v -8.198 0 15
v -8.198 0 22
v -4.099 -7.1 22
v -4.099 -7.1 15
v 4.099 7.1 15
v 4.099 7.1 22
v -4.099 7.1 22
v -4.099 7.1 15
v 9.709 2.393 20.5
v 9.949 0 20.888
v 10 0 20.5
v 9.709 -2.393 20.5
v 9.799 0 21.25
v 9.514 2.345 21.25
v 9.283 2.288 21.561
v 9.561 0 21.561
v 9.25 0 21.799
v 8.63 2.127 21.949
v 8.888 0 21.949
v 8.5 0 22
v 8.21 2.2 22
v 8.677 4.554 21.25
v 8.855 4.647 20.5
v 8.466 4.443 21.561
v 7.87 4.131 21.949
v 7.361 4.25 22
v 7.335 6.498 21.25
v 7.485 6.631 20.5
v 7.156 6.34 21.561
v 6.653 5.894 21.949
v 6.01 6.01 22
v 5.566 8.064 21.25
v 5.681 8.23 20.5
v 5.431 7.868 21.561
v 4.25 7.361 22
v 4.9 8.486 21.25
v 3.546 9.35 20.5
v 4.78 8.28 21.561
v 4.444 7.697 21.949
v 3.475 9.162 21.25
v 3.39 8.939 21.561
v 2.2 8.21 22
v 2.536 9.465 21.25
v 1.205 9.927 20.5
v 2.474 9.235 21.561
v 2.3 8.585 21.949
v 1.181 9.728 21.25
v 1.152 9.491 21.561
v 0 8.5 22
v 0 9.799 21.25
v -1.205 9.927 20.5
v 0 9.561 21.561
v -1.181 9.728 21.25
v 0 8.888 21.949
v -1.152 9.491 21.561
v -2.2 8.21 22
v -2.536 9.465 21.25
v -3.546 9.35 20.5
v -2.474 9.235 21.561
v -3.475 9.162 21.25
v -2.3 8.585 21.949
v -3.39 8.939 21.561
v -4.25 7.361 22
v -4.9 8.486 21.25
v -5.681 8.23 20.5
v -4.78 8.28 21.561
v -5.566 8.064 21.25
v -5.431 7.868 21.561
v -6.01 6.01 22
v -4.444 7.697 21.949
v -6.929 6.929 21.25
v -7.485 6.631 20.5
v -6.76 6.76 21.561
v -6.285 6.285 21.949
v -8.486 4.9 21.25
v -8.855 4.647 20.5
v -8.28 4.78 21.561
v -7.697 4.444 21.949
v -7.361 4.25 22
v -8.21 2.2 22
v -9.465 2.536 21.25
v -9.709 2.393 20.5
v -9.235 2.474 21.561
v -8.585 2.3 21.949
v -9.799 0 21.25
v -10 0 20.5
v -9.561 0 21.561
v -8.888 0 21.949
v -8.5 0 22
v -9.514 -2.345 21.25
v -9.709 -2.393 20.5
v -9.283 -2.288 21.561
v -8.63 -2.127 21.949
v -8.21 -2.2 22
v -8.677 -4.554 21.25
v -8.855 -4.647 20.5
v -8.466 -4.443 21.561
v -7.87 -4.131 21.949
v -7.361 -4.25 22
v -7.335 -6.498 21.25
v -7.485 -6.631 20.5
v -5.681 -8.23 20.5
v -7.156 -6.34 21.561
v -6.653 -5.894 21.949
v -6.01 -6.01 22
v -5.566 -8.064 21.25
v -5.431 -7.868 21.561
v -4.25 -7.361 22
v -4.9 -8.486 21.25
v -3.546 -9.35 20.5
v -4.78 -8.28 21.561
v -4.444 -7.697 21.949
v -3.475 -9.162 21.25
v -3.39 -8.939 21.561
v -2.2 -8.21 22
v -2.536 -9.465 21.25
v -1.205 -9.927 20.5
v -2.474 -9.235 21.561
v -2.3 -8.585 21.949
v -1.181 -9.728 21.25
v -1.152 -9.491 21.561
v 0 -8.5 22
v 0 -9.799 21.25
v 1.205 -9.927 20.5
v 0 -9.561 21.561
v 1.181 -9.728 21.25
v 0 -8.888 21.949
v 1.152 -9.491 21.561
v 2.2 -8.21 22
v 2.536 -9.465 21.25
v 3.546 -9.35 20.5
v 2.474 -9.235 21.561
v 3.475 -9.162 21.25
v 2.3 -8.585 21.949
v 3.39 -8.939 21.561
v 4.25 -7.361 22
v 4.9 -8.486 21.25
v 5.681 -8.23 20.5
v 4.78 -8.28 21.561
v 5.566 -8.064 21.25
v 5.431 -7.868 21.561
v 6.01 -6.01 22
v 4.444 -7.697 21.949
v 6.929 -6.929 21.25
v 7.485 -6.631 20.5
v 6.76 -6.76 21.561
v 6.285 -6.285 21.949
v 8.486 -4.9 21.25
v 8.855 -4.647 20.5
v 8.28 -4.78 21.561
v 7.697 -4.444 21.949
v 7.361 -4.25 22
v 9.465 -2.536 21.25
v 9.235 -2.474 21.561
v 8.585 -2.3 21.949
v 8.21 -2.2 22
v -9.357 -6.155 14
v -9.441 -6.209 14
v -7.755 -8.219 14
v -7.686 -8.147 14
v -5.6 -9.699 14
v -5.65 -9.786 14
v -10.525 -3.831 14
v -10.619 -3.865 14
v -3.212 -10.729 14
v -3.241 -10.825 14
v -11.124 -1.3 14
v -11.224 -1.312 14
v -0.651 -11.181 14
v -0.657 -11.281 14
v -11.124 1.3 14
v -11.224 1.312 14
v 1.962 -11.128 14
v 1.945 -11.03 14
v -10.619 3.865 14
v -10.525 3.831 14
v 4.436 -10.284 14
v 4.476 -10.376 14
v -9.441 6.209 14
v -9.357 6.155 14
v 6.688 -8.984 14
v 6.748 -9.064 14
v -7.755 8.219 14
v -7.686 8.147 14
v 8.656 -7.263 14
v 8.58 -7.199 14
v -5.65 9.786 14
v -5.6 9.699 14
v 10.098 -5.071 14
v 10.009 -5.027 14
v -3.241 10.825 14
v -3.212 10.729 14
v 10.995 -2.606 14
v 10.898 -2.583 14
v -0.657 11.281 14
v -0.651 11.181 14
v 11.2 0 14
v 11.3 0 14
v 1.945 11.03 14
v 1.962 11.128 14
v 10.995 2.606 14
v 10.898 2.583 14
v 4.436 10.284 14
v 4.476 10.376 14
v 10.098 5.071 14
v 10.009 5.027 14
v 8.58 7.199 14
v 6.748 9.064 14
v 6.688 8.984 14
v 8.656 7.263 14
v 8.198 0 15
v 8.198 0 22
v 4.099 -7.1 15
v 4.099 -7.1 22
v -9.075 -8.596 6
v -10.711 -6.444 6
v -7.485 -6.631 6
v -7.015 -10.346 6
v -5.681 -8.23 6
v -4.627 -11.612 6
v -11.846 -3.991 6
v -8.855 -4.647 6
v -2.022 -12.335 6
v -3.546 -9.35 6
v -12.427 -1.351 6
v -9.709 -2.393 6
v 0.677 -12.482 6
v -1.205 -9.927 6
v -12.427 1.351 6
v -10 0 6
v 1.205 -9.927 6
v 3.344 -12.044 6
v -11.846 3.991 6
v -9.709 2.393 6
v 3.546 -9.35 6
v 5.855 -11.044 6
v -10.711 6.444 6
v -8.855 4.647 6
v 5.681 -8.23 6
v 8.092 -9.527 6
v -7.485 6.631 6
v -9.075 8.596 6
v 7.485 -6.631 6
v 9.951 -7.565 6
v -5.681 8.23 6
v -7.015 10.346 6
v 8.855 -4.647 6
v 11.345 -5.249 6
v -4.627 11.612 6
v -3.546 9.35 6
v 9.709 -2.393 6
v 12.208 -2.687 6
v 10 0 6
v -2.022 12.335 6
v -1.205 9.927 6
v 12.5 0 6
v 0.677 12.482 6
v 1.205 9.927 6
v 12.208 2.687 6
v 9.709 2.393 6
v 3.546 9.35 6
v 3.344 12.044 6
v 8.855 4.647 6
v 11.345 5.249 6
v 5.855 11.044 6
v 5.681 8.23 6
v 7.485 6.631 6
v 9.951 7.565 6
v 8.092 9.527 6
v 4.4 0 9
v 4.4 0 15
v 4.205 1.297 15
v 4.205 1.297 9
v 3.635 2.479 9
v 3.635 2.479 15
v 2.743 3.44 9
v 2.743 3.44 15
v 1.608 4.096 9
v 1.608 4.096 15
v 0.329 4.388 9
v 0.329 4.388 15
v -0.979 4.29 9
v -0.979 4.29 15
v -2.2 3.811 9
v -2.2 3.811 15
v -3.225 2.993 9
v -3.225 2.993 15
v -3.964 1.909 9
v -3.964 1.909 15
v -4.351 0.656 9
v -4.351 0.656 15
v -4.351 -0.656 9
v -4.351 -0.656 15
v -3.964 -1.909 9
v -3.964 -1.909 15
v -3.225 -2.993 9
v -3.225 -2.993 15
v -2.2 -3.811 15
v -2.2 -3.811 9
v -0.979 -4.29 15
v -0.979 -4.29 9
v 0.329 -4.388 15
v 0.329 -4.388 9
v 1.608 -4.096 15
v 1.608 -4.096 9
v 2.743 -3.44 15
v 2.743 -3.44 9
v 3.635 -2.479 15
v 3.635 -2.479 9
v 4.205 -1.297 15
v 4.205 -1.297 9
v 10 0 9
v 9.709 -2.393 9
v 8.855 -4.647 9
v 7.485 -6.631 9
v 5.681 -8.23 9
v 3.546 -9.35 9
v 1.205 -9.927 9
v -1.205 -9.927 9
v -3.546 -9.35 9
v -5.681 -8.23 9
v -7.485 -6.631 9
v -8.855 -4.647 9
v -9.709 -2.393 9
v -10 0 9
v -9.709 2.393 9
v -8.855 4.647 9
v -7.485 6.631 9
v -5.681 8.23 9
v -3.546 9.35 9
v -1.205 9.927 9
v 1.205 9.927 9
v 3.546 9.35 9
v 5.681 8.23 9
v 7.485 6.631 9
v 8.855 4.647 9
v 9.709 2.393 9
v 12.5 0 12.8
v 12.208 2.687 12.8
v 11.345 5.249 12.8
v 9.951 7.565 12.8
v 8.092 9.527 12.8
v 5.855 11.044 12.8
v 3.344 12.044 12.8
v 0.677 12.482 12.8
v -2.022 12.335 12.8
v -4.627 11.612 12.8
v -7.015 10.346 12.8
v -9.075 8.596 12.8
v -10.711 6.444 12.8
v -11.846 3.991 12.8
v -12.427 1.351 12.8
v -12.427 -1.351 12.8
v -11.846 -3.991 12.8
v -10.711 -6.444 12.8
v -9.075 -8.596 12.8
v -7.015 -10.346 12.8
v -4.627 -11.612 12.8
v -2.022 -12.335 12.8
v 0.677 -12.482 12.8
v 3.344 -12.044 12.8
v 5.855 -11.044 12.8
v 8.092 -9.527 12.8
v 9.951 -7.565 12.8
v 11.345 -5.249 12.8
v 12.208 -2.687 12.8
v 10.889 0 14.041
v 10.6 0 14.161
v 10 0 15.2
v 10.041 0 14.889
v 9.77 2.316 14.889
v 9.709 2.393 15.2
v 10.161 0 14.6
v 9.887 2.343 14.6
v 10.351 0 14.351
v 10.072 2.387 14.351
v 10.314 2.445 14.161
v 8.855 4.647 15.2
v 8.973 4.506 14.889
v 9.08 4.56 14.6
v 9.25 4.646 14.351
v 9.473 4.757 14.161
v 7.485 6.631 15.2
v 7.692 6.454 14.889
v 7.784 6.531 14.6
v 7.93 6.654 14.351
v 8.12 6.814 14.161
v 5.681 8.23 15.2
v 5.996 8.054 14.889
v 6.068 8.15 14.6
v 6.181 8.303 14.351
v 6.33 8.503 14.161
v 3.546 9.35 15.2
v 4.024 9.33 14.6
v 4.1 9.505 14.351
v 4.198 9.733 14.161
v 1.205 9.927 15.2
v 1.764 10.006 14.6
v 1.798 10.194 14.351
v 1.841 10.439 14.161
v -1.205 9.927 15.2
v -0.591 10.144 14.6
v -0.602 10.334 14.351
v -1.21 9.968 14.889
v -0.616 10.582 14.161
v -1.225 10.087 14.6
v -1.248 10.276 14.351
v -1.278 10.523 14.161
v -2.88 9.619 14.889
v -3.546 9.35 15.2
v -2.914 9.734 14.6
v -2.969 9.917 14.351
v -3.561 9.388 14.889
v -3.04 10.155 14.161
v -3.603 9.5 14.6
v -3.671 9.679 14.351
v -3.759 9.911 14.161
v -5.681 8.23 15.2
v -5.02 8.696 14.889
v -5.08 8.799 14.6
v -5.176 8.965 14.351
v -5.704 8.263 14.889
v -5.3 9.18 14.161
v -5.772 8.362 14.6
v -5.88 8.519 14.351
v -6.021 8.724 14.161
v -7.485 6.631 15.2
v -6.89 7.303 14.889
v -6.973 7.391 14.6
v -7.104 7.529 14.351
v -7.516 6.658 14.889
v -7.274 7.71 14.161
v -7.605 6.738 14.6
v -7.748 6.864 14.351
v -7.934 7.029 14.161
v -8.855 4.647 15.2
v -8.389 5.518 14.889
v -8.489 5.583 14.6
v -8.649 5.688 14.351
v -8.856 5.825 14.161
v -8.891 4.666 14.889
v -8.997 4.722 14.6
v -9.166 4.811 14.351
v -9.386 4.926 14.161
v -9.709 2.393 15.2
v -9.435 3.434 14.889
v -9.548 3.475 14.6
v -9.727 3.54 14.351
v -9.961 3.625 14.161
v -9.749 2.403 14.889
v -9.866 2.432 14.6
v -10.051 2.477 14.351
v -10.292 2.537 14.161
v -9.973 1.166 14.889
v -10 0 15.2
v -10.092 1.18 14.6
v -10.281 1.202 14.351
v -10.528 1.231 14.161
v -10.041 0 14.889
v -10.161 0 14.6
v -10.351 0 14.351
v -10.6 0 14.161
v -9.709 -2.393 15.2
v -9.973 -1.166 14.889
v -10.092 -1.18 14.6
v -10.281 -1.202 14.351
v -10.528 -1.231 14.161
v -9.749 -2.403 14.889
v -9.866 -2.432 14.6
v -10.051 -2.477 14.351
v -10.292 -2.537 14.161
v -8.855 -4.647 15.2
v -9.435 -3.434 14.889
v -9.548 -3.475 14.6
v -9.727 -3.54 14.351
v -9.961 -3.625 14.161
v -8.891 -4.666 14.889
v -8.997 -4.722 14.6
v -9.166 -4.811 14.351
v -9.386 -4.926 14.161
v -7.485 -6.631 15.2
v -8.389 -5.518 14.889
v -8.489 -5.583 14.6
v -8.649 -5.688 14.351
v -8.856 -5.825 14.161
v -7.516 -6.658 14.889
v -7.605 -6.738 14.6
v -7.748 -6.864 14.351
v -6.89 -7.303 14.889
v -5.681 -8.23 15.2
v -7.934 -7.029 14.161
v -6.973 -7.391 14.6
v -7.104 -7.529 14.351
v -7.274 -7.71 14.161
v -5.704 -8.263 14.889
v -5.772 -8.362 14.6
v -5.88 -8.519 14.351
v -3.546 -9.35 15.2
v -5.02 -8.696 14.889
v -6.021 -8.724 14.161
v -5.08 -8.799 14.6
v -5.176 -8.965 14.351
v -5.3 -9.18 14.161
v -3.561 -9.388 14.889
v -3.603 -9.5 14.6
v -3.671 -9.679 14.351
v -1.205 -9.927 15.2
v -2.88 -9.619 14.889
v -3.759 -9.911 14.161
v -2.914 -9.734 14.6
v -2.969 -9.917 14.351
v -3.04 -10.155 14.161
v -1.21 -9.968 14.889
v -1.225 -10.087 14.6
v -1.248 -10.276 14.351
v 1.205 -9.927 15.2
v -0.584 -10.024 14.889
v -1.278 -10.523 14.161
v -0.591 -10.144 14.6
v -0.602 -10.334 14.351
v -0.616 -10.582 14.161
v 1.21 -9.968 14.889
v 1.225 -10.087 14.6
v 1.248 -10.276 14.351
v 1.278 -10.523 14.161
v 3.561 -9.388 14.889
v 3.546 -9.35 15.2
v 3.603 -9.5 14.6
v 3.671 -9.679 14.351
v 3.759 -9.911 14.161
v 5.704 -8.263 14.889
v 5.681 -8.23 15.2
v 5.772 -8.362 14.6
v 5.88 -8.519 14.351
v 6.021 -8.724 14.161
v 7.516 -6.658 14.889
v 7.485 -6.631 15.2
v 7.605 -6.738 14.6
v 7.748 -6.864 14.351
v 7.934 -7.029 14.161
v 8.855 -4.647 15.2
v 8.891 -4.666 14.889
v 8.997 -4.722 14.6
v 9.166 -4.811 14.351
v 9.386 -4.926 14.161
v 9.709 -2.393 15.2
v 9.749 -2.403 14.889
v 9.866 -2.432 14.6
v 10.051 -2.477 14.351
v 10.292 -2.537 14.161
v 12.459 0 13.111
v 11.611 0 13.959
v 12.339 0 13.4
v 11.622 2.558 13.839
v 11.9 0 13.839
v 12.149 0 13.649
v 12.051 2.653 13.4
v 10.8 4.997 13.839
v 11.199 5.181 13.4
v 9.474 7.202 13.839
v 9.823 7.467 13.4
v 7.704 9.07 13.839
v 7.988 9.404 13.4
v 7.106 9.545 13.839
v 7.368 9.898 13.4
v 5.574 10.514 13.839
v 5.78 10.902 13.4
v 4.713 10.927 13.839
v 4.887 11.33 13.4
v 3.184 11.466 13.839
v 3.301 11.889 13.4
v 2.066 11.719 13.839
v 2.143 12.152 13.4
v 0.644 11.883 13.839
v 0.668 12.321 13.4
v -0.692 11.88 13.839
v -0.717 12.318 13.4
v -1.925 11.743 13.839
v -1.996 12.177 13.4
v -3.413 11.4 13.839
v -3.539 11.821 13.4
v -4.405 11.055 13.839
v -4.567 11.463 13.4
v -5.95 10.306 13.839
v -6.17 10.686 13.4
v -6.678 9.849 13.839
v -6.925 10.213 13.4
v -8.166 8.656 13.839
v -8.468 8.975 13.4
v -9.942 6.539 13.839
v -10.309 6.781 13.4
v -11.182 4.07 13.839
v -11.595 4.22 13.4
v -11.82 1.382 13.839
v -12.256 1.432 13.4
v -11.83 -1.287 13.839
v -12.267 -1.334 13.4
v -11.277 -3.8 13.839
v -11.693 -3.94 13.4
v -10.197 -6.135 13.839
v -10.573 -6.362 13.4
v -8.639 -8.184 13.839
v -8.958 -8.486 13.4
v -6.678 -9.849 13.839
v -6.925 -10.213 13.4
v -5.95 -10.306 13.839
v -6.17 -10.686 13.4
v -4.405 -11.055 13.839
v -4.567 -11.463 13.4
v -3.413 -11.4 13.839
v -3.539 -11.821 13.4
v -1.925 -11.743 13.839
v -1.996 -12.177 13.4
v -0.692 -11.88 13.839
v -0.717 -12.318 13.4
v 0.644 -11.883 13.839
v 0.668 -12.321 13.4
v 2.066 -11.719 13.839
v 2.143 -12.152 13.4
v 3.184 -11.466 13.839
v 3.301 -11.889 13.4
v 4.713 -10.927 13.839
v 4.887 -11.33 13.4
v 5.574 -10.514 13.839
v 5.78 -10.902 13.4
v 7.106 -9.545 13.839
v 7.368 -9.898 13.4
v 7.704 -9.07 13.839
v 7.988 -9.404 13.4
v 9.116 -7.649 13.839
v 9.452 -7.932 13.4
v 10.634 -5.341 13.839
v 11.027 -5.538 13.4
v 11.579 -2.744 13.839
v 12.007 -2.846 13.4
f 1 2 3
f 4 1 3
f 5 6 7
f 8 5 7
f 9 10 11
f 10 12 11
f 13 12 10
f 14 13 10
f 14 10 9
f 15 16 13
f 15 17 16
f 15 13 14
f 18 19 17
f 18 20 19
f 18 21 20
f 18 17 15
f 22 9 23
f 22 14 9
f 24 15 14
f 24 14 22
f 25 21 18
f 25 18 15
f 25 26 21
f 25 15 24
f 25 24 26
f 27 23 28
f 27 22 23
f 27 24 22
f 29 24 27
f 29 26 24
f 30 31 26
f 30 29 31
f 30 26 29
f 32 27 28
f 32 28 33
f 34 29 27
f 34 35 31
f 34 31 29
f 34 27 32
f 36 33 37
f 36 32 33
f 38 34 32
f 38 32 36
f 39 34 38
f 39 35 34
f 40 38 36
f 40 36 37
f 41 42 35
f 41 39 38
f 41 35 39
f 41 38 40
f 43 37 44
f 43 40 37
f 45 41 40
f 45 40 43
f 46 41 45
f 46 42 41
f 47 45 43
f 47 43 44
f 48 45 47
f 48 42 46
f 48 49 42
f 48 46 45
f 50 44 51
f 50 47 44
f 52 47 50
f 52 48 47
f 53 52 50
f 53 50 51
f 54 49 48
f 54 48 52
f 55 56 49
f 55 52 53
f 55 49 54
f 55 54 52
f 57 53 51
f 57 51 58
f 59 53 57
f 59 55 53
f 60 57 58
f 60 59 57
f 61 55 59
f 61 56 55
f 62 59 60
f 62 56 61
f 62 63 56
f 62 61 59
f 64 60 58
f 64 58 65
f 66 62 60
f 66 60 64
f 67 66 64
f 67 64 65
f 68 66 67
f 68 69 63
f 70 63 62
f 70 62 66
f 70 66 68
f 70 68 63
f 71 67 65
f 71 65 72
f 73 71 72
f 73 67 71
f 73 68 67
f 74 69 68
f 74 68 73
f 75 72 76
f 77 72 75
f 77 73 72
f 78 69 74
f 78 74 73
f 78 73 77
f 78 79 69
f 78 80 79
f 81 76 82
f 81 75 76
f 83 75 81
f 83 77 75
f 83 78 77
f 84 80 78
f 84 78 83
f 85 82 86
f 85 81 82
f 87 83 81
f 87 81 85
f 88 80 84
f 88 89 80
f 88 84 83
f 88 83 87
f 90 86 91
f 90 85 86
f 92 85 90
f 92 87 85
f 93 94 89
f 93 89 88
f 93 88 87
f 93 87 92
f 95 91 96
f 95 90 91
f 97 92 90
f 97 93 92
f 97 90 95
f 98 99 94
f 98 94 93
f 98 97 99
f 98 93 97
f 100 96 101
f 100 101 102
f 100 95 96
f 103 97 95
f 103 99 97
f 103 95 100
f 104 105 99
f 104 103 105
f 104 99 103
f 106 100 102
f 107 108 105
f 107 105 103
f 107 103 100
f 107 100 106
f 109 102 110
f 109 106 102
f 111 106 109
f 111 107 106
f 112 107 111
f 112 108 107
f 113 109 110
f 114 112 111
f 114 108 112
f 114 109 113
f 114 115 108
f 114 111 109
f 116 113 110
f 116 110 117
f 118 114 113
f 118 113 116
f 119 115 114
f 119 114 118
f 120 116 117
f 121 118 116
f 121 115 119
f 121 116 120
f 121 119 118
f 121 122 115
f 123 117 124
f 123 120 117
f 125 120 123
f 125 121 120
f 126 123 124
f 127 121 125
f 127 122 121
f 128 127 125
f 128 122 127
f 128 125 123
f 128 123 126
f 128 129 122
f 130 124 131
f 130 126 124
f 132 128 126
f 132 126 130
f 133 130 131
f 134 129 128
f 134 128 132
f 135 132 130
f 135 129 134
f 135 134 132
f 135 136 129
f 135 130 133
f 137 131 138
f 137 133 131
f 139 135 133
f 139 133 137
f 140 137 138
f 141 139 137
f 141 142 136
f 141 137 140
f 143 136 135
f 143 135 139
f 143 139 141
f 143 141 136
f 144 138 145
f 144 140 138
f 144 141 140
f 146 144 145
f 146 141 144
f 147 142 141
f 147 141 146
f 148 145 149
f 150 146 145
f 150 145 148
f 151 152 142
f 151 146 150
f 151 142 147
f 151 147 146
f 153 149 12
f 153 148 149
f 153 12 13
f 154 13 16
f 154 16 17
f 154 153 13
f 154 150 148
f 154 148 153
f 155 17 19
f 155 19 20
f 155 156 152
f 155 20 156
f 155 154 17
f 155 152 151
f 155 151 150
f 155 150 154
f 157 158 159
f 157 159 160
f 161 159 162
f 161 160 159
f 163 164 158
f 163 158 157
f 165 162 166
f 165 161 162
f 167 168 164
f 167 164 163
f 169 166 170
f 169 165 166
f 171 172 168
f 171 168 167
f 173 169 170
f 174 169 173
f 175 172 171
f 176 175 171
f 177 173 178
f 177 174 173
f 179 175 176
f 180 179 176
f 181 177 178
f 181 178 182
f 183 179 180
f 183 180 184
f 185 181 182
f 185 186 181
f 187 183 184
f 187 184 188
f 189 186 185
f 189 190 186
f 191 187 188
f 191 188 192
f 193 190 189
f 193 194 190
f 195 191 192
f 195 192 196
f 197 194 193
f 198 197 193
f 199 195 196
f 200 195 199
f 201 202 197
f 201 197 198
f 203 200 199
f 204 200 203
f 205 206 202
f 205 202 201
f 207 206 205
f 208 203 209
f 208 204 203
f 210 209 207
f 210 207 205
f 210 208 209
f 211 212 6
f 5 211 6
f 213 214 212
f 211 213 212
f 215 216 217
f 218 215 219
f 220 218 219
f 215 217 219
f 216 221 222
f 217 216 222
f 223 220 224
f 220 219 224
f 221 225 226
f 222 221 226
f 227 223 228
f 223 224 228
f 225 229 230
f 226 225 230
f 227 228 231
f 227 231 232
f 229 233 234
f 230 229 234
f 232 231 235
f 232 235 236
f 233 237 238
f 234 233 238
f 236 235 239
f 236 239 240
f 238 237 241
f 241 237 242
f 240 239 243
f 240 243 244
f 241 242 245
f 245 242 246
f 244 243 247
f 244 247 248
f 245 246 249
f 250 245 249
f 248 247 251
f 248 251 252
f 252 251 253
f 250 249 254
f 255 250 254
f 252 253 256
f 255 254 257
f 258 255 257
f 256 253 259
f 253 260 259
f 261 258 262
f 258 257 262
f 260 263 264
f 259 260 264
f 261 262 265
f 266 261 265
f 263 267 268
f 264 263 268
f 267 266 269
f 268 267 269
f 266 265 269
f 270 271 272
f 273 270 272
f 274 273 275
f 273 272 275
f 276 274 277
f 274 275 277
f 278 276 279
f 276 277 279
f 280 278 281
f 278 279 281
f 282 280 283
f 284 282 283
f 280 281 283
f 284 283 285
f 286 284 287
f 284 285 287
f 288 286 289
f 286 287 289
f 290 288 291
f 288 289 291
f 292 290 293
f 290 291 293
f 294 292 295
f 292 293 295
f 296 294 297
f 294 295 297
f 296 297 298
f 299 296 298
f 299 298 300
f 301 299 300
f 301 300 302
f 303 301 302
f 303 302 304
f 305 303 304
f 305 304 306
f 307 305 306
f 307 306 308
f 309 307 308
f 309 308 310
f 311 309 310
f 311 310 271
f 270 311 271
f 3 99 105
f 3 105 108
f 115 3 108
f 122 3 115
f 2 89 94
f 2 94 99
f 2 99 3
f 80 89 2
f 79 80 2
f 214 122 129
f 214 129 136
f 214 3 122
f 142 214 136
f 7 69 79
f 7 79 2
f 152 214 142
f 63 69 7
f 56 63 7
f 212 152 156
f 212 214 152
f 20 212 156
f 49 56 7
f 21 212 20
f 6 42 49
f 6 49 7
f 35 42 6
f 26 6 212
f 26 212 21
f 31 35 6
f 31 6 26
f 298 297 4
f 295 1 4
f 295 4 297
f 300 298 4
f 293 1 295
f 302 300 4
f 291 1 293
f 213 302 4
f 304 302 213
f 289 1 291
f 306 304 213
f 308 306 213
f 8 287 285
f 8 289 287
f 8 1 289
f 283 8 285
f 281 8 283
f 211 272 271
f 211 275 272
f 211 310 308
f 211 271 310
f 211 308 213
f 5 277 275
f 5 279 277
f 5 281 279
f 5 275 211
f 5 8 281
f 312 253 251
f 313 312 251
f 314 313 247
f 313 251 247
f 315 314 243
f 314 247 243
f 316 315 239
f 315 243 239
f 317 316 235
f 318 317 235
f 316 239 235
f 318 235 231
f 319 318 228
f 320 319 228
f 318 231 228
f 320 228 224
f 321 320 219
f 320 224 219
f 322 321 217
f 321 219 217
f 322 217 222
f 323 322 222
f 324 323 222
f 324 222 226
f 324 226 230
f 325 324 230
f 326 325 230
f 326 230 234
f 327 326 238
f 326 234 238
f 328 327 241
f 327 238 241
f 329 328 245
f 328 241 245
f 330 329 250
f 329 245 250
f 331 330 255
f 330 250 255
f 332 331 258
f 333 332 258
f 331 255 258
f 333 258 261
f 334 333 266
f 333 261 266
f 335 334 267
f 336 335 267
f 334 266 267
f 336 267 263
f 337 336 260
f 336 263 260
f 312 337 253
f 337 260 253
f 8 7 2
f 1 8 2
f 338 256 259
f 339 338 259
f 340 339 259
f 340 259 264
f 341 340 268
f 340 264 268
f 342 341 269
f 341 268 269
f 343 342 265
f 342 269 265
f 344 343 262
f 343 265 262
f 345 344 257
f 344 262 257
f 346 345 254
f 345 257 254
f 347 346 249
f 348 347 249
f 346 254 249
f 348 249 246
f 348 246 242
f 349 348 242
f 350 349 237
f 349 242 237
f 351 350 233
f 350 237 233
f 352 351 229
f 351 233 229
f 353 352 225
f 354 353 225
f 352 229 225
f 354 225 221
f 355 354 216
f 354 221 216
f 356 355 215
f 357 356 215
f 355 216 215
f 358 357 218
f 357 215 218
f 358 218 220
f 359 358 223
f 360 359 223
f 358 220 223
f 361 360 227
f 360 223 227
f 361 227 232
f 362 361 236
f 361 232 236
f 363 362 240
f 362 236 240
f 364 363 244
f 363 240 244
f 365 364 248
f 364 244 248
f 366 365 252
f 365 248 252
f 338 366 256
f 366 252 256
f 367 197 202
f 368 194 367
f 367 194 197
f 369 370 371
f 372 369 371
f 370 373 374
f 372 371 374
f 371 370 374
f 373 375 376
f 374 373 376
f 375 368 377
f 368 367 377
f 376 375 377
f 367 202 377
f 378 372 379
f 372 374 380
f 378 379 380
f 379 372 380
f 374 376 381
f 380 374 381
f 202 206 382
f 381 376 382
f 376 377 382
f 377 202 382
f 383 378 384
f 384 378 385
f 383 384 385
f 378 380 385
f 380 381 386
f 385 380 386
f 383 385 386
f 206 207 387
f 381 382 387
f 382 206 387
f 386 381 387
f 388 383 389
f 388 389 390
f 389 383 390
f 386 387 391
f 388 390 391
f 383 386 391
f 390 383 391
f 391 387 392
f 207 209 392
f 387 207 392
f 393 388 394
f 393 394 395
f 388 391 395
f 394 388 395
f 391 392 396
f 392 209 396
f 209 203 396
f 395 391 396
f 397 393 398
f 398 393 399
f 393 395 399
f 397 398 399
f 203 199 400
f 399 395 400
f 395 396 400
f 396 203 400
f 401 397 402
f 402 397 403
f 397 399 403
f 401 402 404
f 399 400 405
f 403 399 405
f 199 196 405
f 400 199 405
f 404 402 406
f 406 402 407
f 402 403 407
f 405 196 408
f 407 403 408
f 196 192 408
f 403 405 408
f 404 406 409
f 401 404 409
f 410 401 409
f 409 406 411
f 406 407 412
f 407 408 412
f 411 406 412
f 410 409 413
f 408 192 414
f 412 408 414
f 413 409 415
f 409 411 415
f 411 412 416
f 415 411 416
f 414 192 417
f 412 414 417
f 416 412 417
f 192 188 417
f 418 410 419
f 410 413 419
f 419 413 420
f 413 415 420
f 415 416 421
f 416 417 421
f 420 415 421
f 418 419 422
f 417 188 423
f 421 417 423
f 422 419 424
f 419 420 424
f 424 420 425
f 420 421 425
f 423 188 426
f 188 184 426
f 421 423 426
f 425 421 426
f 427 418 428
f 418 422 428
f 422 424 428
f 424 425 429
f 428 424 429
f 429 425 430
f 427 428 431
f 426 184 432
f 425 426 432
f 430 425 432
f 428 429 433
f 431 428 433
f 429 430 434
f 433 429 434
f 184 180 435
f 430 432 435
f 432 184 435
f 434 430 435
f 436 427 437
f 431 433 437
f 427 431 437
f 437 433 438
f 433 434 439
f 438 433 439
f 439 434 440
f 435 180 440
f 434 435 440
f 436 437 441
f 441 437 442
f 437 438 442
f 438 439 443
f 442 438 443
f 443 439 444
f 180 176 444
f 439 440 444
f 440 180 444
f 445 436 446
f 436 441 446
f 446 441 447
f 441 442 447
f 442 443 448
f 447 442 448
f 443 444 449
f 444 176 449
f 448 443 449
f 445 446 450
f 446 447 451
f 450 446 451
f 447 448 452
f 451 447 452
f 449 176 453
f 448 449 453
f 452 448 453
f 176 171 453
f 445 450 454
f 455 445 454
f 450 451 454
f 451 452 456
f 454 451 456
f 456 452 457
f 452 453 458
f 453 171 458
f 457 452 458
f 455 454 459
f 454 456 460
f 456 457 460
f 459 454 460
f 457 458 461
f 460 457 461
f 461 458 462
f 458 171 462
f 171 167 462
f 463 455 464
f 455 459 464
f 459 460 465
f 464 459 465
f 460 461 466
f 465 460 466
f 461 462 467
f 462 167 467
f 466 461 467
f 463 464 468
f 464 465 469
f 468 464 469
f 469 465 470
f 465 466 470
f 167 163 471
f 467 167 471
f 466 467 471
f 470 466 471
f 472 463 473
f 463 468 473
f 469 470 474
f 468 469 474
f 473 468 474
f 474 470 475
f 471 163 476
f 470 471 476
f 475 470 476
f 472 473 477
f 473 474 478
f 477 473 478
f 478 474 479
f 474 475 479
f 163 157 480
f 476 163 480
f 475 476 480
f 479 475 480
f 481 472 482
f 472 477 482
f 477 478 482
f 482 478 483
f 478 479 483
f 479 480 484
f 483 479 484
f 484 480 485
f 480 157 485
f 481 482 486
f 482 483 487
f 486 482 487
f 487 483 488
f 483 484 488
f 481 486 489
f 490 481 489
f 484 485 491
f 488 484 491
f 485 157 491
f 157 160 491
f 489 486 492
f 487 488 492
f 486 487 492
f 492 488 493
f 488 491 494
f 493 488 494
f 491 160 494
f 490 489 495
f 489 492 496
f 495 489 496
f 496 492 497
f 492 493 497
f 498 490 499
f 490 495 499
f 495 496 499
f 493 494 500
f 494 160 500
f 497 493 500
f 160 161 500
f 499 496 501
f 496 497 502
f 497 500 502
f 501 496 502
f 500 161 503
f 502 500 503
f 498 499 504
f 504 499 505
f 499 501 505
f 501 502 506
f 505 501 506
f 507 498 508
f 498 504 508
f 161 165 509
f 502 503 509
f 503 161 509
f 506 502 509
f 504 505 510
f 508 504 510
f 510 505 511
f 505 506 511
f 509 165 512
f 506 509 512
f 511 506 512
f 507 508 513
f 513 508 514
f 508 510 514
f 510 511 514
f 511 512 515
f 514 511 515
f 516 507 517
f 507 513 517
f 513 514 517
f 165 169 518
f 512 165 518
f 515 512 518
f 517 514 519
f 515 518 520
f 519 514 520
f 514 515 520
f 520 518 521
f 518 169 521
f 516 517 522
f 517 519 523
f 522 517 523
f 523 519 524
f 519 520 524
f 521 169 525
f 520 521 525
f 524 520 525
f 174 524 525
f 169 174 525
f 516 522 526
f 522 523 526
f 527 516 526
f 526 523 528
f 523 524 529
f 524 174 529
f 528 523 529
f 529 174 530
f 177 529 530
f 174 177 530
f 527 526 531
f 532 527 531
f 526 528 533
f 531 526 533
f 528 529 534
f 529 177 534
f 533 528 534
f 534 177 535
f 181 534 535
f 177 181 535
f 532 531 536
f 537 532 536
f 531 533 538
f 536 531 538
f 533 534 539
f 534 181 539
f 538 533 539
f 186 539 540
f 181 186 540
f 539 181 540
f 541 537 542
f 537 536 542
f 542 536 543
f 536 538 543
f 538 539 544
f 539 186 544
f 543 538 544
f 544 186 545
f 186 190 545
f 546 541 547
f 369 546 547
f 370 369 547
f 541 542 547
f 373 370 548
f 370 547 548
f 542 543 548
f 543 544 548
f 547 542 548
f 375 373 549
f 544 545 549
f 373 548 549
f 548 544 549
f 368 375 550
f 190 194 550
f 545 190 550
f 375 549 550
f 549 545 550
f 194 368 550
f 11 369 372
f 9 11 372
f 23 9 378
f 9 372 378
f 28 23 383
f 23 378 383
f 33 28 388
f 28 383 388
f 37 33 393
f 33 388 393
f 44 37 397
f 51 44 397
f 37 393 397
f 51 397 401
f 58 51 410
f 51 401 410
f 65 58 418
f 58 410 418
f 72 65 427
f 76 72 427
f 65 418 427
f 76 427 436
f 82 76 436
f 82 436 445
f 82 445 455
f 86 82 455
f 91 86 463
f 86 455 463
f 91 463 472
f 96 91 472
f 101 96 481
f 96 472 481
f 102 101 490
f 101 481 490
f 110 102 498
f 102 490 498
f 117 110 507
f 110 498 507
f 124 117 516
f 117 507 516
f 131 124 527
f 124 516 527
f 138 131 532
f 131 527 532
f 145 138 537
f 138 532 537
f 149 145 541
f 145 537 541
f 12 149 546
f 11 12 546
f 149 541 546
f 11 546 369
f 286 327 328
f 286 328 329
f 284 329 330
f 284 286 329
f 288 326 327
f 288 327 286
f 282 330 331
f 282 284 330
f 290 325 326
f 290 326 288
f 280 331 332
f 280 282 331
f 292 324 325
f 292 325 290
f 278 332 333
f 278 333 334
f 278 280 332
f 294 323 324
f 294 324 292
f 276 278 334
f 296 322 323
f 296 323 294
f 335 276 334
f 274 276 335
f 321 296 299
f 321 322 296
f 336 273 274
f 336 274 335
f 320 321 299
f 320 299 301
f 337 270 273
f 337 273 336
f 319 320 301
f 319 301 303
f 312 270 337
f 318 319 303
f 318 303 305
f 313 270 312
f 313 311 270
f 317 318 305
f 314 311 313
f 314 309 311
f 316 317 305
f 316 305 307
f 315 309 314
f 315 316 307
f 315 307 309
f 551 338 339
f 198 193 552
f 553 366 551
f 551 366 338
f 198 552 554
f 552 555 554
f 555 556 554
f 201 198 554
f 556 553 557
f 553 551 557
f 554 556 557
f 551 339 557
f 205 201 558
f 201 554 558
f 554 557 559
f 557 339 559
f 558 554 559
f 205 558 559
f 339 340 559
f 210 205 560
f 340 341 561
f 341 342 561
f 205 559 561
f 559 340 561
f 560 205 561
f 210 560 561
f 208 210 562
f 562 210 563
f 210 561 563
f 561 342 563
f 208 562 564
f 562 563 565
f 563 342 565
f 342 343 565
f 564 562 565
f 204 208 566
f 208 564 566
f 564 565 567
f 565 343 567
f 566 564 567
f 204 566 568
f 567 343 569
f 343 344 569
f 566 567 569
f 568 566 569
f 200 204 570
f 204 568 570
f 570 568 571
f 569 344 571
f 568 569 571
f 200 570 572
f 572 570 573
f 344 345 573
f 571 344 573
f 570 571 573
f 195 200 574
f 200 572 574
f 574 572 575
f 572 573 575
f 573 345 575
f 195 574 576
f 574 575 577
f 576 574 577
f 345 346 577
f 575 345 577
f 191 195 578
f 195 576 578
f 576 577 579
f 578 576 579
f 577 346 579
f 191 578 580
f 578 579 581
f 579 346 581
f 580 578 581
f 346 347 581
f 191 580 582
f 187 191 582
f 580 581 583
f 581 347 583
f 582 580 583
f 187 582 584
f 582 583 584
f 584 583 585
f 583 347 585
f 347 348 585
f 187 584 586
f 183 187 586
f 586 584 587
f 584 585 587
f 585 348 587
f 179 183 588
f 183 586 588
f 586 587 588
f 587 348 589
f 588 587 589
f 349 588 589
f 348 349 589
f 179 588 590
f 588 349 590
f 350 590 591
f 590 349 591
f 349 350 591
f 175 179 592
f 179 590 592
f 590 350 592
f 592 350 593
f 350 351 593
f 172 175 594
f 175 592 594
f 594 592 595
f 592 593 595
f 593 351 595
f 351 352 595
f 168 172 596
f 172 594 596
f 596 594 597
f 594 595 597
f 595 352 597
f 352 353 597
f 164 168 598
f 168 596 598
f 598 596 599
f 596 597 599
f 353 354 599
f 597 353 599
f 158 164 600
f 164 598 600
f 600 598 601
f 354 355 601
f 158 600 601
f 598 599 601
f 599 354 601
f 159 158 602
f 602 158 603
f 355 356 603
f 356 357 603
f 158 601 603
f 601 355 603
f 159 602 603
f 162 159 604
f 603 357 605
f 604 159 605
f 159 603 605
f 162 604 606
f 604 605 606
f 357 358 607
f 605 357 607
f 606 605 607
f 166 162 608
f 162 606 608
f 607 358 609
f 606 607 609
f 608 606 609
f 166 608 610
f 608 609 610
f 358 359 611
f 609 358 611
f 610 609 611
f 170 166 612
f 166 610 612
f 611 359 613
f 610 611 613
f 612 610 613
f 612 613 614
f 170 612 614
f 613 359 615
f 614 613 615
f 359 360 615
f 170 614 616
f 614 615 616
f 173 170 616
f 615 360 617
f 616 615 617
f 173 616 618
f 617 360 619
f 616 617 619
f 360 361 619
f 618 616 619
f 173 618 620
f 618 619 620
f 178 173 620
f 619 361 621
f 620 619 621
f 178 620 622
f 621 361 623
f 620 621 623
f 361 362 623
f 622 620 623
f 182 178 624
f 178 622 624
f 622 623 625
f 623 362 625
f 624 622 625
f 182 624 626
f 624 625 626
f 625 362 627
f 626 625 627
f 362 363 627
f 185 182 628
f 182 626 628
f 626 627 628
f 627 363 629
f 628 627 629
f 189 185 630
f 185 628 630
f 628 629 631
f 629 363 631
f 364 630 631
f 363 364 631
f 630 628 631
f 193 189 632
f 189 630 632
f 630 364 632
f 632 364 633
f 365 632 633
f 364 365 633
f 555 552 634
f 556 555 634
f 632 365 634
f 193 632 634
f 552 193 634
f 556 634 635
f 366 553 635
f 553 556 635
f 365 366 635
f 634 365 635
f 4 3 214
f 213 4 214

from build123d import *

# Parameters (mm, degrees)
SKETCH004_R     = 12.5
PAD002_DEPTH    = 8
SKETCH005_R     = 10
POCKET002_DEPTH = 3
SKETCH006_R     = 10
PAD003_DEPTH    = 8
SKETCH007_R     = 4.4
POCKET003_DEPTH = 16.001
POCKET004_DEPTH = 7
FILLET002_R     = 1.5
FILLET003_R     = 1.2


with BuildPart() as part:
    # Sketch004 → Pad002 (new body)
    with BuildSketch(Plane.XY.offset(6)):
        Circle(SKETCH004_R)
    extrude(amount=PAD002_DEPTH)

    # Sketch005 → Pocket002 (cut)
    with BuildSketch(Plane(origin=(0, 0, 6), x_dir=(1, 0, 0), z_dir=(0, 0, -1))):
        Circle(SKETCH005_R)
    extrude(amount=-POCKET002_DEPTH, mode=Mode.SUBTRACT)

    # Sketch006 → Pad003 (new body)
    with BuildSketch(Plane.XY.offset(14)):
        Circle(SKETCH006_R)
    extrude(amount=PAD003_DEPTH)

    # Sketch007 → Pocket003 (cut, through all)
    with BuildSketch(Plane.XY.offset(22)):
        Circle(SKETCH007_R)
    extrude(amount=-POCKET003_DEPTH, mode=Mode.SUBTRACT)

    # Sketch008 → Pocket004 (cut)
    with BuildSketch(Plane.XY.offset(22)):
        Polygon((4.099187, -7.1), (8.198374, 0), (4.099187, 7.1), (-4.099187, 7.1), (-8.198374, 0), (-4.099187, -7.1), align=None)
    extrude(amount=-POCKET004_DEPTH, mode=Mode.SUBTRACT)

    # Fillet002
    fillet002_edges = [part.edges().sort_by_distance(p)[0] for p in [
        (-10, 0, 22),
    ]]
    fillet(fillet002_edges, radius=FILLET002_R)

    # Fillet003
    fillet003_edges = [part.edges().sort_by_distance(p)[0] for p in [
        (-12.5, 0, 14),
        (-10, 0, 14),
    ]]
    fillet(fillet003_edges, radius=FILLET003_R)


solid = part.part
